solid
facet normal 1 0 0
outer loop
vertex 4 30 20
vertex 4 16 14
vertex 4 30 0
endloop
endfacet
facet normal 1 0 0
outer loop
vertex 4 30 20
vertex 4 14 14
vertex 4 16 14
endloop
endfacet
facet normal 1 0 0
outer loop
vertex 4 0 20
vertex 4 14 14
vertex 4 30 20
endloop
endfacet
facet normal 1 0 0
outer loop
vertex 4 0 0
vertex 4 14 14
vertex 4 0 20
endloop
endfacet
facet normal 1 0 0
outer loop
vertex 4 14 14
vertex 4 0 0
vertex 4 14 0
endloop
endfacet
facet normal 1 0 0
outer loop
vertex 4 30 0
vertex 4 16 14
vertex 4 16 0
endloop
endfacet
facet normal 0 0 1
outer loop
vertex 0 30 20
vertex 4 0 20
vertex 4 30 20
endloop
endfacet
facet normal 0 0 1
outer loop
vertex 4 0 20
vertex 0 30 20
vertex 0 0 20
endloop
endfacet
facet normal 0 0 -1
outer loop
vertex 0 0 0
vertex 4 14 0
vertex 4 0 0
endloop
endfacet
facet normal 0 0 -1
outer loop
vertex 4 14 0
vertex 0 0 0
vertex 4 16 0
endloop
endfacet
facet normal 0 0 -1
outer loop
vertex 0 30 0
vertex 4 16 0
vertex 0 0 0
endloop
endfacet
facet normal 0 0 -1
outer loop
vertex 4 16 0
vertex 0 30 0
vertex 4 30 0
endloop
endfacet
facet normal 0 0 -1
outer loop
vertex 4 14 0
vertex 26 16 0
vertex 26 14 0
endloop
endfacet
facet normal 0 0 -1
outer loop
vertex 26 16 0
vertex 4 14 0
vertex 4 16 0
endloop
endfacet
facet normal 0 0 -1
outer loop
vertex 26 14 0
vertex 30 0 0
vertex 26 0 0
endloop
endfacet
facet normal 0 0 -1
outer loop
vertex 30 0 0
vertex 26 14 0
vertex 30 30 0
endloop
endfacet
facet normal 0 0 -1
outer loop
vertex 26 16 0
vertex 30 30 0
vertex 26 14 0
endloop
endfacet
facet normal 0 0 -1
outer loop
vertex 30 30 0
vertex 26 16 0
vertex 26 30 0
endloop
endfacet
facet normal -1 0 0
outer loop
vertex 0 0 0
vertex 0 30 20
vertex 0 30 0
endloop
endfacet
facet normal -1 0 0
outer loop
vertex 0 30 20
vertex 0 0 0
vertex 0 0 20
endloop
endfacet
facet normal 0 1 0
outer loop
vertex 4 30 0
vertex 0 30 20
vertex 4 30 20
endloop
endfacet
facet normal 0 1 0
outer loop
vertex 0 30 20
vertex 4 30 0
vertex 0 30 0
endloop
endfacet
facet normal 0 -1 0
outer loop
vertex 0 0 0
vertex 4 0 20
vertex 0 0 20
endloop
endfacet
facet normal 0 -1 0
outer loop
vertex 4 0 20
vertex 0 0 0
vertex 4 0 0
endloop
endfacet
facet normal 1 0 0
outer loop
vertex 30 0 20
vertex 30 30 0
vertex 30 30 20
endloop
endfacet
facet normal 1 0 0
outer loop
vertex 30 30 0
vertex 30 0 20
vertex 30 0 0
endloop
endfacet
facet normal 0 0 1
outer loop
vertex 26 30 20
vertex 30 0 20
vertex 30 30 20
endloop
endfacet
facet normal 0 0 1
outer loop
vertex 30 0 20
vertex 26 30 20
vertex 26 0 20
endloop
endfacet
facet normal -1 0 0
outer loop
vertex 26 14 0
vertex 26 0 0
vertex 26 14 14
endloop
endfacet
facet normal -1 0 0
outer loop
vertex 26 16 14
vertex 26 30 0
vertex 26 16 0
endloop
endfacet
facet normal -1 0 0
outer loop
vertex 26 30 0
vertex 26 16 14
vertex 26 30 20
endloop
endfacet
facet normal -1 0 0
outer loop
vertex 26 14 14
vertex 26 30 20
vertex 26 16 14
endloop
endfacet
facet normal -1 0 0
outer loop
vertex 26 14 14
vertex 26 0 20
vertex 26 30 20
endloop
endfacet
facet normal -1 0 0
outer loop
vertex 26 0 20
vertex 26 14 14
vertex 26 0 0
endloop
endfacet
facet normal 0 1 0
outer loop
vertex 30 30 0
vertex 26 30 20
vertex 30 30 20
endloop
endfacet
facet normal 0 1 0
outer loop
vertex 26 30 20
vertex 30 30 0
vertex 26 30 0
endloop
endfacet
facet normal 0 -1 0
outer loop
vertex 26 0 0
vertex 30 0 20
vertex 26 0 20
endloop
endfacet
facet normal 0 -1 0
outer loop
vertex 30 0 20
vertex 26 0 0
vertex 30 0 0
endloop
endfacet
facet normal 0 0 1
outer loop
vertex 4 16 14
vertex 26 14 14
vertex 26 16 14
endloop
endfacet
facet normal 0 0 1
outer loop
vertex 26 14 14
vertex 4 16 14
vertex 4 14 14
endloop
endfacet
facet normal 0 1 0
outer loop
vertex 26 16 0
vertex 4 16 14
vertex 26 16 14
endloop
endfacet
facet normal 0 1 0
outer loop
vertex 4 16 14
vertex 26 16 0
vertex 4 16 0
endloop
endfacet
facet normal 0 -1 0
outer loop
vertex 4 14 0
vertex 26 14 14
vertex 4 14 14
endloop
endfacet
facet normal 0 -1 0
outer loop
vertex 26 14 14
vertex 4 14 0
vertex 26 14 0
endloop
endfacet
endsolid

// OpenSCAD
// Rib: a thin structural fin connecting two faces/walls.
wall_t = 4; span = 22; wall_h = 20; rib_t = 2;

union() {
    cube([wall_t, span + 2 * wall_t, wall_h]);
    translate([wall_t + span, 0, 0]) cube([wall_t, span + 2 * wall_t, wall_h]);
    // thin connecting rib between the two walls
    translate([wall_t, span / 2 + wall_t - rib_t / 2, 0])
        cube([span, rib_t, wall_h * 0.7]);
}
